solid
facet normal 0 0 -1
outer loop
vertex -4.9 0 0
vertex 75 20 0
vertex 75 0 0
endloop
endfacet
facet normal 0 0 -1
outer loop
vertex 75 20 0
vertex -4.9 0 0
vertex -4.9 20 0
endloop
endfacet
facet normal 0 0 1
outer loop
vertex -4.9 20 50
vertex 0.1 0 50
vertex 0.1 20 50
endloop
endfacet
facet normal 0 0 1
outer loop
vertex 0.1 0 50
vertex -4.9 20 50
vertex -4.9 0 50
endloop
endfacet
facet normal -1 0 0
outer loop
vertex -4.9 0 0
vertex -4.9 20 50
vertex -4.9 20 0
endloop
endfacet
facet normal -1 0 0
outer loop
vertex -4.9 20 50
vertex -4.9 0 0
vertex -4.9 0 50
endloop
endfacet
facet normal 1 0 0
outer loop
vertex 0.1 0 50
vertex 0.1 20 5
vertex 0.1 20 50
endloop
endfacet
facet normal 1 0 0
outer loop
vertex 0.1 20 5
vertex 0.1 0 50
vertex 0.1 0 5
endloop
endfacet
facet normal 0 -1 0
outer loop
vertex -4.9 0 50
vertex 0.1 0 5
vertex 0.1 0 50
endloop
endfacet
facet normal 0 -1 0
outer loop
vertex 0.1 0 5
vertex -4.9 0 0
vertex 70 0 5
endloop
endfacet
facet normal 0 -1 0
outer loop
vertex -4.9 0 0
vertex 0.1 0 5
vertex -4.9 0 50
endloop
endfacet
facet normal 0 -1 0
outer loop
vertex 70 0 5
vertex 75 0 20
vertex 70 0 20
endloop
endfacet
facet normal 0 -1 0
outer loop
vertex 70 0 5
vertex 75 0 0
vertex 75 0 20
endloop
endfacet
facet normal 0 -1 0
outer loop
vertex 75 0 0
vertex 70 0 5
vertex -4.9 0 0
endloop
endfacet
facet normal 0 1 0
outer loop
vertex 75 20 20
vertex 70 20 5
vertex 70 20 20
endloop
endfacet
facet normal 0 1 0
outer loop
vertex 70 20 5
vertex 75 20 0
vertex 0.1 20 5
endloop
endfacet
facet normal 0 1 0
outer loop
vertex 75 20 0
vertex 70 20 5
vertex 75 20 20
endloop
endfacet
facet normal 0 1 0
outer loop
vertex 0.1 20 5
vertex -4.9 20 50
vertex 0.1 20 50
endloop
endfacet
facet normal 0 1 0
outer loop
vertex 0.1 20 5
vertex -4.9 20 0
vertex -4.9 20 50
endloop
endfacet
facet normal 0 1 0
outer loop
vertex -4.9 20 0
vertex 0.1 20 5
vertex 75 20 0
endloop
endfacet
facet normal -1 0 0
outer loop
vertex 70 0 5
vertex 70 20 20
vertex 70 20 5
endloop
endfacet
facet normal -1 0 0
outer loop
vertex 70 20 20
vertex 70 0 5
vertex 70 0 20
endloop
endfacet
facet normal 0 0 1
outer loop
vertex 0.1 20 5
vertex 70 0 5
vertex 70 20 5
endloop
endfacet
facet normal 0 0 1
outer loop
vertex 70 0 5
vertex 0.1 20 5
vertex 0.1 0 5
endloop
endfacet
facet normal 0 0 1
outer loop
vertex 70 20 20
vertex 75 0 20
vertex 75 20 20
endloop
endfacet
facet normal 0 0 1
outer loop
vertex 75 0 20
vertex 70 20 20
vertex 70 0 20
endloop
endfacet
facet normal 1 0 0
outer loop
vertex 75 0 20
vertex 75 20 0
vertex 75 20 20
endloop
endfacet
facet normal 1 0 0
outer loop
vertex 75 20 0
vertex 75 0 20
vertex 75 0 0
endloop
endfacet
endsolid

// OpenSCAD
translate([0.1,0,0]) {
	rotate([0,270,0]) {
		cube([50,20,5]);
	}
}

rotate([0,0,0]) {
	cube([70,20,5]);
}

translate([75,0,0]) {
	rotate([0,270,0]) {
		cube([20,20,5]);
	}
}
